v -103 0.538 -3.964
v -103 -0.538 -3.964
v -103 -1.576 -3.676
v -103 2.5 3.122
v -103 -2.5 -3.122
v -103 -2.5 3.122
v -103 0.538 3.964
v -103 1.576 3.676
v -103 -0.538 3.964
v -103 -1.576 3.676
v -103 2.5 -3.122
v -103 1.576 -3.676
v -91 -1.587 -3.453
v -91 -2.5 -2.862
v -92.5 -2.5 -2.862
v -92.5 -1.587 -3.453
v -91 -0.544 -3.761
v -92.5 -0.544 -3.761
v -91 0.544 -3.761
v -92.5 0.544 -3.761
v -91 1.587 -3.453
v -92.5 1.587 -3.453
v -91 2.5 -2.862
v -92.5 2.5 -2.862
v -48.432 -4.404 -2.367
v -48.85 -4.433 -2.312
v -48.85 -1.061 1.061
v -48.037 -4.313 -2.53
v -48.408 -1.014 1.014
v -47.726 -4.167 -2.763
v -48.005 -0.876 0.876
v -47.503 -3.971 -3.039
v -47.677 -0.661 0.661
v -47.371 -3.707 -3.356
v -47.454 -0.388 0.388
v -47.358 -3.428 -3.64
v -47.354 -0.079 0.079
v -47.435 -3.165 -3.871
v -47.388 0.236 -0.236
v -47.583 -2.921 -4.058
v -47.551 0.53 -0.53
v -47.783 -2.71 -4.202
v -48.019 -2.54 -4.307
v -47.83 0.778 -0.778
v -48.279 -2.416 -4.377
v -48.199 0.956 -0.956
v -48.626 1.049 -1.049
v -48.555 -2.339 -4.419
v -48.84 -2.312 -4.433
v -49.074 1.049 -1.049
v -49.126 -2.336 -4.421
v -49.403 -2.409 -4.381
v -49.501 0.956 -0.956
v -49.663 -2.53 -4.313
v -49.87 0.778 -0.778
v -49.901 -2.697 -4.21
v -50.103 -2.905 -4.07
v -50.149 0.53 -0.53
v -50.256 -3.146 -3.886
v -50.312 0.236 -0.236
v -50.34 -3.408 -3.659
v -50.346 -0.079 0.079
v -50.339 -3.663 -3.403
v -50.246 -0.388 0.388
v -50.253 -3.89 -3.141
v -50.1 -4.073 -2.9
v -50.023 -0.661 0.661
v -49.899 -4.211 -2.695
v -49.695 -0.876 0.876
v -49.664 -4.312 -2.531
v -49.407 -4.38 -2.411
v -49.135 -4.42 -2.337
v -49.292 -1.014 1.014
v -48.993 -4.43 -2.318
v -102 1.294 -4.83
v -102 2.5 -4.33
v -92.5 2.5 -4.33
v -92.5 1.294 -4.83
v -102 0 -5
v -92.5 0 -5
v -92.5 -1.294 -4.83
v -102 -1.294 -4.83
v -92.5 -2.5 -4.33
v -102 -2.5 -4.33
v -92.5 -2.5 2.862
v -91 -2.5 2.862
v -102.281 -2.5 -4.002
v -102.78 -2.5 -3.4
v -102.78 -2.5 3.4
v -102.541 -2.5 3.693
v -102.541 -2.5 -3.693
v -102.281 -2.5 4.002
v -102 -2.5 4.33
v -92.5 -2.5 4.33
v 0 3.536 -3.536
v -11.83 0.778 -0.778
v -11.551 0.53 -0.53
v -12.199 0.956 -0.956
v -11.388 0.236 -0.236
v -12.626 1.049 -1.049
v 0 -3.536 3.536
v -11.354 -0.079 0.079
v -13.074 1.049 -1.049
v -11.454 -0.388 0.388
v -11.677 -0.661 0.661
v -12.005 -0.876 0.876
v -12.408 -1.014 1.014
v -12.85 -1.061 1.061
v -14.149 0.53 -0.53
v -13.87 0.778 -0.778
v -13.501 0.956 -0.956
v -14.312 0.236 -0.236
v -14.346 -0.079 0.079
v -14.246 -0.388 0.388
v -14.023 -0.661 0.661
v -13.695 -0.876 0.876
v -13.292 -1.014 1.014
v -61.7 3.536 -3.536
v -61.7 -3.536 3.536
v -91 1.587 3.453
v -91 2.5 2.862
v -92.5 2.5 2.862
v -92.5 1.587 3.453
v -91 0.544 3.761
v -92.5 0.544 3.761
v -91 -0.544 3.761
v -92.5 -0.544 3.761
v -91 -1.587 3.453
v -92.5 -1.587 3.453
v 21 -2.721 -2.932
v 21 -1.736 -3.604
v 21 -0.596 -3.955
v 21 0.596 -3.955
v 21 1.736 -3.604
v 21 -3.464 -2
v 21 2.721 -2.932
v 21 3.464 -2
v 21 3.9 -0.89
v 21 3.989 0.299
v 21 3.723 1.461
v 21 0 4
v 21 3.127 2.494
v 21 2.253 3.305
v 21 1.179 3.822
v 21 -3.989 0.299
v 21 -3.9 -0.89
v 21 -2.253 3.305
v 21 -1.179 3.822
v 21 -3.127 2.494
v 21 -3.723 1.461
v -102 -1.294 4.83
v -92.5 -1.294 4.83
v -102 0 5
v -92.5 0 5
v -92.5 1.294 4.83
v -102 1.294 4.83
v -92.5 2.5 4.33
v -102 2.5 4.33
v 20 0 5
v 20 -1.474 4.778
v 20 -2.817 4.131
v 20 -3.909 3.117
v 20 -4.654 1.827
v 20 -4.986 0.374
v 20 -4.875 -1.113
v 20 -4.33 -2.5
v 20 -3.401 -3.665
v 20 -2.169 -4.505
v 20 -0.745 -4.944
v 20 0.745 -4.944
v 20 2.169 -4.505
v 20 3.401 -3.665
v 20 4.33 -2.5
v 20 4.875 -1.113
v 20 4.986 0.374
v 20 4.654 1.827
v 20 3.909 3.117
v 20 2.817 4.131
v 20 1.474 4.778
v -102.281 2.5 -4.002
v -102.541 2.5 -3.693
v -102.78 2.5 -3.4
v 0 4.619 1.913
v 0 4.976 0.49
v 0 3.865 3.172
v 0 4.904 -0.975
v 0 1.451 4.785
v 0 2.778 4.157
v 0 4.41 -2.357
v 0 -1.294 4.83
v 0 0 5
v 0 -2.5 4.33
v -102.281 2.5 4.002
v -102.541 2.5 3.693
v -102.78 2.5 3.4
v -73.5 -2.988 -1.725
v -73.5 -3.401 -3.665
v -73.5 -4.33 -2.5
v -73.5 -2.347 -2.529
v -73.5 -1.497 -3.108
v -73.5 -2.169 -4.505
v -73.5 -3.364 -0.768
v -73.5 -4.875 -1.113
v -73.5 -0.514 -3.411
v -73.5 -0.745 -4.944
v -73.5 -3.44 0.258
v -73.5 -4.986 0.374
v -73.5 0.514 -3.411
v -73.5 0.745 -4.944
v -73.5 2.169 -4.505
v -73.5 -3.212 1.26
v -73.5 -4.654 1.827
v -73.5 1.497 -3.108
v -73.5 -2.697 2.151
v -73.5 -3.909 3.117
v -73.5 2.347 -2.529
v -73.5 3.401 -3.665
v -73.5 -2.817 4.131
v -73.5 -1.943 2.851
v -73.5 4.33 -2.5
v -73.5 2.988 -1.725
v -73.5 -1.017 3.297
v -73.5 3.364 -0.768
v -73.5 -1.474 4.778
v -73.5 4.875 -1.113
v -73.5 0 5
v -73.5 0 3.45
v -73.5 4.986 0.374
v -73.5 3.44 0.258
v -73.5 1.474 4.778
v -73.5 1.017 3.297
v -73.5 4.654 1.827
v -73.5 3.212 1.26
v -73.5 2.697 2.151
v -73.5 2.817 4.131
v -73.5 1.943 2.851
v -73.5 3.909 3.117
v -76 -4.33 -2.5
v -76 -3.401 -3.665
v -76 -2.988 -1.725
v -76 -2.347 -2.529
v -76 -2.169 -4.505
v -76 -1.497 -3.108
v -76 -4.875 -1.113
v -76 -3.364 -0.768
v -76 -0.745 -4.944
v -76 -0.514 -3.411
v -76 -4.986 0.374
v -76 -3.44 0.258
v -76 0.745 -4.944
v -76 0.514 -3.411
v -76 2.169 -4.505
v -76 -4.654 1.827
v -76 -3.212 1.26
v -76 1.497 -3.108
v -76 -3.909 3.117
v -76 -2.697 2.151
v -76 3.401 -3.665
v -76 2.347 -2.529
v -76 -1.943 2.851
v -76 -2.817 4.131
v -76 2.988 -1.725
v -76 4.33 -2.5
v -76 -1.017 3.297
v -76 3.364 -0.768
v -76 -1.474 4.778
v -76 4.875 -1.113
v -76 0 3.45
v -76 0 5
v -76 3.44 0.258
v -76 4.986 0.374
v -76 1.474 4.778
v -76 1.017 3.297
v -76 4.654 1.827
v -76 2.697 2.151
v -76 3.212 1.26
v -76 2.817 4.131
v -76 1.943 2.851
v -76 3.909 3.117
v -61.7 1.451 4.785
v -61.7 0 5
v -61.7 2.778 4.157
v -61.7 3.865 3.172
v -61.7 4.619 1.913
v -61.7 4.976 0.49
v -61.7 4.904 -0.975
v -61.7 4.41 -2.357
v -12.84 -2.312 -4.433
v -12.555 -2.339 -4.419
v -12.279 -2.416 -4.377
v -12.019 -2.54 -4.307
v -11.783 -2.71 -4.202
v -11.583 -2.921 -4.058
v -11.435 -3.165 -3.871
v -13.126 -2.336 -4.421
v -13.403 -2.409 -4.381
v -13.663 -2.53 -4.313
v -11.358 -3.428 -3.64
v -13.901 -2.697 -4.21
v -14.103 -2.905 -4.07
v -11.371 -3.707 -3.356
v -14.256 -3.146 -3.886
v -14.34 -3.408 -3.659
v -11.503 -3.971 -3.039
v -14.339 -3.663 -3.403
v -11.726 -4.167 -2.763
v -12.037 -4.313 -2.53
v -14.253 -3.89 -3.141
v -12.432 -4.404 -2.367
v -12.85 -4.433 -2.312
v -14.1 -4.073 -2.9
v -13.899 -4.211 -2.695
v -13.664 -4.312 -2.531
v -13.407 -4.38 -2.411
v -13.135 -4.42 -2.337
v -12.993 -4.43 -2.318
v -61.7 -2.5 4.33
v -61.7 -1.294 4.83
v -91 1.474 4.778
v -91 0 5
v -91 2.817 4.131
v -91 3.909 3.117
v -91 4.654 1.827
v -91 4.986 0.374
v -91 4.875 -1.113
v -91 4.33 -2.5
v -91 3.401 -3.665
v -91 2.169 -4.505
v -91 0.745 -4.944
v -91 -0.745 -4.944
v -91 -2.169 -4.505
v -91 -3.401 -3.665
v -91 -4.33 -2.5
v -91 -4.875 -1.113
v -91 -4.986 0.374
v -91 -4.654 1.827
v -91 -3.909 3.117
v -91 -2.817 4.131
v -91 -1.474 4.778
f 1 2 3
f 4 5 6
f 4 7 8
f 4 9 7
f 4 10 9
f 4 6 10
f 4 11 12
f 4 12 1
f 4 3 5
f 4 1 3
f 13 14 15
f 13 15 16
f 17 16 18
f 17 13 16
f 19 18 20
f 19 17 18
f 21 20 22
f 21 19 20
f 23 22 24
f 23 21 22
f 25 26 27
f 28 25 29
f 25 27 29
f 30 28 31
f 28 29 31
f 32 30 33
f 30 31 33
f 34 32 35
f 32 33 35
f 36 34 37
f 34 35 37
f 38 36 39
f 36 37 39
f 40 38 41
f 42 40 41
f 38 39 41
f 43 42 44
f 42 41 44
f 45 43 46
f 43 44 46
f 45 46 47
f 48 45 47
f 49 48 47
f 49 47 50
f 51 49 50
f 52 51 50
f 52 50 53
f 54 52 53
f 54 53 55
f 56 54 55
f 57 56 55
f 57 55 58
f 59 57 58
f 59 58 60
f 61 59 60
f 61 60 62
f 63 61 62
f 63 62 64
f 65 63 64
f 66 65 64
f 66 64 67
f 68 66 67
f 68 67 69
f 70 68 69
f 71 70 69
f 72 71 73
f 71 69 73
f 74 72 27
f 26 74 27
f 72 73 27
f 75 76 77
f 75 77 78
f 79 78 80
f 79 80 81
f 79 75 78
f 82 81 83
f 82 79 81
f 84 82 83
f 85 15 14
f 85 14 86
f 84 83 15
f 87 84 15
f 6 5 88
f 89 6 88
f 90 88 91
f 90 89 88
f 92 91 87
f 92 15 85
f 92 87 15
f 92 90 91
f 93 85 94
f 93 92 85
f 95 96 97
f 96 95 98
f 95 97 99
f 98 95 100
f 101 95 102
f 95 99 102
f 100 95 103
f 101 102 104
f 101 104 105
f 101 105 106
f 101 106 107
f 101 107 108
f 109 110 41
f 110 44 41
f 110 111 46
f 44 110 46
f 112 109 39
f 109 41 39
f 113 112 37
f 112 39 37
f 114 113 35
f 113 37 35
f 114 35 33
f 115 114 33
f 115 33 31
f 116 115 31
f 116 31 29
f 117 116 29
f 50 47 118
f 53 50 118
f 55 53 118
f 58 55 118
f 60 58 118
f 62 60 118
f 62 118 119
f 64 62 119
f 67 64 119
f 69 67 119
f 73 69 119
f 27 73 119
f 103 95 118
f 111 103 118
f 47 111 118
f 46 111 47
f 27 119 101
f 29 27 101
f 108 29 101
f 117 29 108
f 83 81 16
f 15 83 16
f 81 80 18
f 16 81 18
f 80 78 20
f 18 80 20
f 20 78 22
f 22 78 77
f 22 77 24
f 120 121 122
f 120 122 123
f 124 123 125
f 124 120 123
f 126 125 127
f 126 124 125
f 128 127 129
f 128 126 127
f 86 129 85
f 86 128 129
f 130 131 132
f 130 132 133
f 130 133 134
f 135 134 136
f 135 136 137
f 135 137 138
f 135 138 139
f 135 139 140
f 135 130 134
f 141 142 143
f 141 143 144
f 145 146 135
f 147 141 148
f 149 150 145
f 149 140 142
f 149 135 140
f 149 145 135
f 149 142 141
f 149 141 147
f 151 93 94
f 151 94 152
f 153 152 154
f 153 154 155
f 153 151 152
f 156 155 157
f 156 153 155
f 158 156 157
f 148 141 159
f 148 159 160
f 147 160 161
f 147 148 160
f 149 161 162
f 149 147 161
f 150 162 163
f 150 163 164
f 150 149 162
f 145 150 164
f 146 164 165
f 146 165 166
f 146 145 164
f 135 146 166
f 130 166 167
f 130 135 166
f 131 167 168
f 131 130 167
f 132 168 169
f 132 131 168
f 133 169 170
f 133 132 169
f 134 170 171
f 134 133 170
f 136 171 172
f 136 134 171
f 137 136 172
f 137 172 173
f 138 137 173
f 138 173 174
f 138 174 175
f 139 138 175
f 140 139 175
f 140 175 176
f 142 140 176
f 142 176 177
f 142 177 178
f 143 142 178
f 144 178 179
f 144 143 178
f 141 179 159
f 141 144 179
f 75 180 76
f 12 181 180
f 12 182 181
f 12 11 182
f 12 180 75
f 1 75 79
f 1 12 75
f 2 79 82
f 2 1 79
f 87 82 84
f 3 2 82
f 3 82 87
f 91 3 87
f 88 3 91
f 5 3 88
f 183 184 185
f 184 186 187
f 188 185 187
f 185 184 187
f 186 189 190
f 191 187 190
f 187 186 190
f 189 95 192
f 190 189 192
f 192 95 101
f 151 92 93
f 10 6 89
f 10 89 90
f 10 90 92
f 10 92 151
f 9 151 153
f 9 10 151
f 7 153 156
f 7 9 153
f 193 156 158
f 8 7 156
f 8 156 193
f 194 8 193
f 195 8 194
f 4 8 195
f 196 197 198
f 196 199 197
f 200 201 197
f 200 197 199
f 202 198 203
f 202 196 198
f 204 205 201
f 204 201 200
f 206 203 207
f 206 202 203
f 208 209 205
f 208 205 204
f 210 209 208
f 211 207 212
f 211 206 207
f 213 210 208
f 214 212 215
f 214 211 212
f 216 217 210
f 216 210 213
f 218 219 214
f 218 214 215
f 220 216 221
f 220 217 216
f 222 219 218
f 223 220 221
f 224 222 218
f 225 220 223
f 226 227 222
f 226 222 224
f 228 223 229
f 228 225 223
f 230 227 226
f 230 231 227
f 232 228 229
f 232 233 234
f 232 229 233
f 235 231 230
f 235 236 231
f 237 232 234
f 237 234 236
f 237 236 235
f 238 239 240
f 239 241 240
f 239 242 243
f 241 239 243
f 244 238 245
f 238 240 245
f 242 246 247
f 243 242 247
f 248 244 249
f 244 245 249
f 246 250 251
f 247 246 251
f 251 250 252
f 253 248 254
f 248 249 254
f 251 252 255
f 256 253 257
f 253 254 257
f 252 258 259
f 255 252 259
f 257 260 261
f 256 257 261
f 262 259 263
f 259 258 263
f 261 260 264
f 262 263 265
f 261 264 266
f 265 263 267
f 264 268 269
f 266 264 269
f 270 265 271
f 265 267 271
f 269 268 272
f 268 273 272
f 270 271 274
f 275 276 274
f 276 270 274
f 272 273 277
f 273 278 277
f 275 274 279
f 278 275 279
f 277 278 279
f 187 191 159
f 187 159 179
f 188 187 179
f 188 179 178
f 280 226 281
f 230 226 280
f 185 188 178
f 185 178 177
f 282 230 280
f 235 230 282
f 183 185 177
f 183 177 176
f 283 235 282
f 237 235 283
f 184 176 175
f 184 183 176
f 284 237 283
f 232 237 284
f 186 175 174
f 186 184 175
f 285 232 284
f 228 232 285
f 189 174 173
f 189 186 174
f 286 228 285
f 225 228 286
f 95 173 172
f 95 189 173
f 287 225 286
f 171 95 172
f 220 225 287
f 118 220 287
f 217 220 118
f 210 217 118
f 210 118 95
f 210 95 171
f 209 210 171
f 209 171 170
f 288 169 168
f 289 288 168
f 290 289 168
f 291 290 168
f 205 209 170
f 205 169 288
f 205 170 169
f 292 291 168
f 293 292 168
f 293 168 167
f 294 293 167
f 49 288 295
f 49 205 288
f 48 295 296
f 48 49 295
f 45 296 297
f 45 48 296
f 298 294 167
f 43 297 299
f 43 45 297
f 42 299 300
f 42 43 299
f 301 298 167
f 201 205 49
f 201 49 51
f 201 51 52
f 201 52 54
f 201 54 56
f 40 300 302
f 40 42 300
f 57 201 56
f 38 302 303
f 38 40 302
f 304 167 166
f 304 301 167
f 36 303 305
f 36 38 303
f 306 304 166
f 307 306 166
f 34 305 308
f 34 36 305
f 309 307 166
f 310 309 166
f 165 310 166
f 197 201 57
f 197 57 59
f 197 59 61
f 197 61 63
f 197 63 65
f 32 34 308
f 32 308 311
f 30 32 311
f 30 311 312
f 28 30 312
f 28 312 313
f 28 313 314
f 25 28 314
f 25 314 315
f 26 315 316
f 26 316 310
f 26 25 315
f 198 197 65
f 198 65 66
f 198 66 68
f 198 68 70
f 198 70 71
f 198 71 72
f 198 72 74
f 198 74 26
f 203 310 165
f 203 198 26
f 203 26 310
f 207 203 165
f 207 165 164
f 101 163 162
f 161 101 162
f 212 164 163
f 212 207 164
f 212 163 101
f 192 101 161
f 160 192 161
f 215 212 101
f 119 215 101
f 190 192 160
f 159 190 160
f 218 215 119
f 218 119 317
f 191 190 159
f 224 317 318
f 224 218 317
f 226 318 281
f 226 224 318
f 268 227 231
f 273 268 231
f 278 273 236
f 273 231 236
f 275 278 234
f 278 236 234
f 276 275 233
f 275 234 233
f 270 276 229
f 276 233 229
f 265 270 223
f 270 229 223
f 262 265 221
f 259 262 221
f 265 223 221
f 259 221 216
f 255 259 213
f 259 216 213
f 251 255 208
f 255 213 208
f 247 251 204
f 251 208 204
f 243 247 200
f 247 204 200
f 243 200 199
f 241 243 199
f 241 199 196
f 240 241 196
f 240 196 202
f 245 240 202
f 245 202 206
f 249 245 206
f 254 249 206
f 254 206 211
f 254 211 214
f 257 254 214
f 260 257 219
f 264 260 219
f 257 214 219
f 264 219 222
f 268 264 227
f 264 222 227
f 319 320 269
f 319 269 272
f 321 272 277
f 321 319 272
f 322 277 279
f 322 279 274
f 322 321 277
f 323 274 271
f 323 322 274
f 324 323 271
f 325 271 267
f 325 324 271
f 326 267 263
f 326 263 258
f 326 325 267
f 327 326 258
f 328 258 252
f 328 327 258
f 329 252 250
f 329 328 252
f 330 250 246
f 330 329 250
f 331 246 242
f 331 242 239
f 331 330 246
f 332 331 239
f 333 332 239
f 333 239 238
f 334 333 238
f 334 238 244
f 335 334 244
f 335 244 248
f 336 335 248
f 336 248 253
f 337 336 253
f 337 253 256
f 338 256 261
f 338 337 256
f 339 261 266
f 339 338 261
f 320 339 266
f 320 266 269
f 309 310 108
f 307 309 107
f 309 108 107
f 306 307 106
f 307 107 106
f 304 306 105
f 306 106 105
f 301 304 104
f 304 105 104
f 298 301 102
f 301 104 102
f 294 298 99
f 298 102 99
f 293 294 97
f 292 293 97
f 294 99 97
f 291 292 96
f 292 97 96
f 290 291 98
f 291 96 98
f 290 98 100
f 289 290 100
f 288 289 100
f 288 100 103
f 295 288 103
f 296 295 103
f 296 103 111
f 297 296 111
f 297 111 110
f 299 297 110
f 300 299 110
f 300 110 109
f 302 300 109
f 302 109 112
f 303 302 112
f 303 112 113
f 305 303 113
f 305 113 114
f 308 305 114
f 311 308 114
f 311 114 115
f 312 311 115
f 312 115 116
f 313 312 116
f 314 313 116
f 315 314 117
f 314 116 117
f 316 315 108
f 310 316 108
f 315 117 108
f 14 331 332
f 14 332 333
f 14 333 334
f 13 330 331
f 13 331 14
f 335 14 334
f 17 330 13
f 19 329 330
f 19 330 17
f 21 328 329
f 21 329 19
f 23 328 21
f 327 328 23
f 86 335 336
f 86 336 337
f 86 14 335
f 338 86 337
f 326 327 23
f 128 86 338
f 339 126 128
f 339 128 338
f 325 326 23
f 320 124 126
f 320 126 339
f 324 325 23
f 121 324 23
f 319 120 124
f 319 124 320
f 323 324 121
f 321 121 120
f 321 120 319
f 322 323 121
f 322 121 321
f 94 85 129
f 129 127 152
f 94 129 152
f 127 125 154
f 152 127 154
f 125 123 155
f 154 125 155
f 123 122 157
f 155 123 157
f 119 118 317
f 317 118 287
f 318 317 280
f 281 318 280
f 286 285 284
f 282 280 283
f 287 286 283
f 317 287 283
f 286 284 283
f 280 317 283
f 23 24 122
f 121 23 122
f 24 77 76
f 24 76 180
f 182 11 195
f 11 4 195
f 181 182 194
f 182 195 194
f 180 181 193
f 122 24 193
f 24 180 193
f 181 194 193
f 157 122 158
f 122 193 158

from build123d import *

# Parameters (mm, degrees)
SKETCH1_R            = 5
BOSS_EXTRUDE1_DEPTH  = 21
CHAMFER1_SIZE        = 1
BOSS_EXTRUDE2_START  = 61.7
BOSS_EXTRUDE2_DEPTH  = 61.7
BOSS_EXTRUDE5_START  = 11.8
SKETCH3_R            = 5
BOSS_EXTRUDE5_DEPTH  = 11.8
SKETCH5_R            = 3.45
BOSS_EXTRUDE6_DEPTH  = 2.5
BOSS_EXTRUDE7_START  = 15
SKETCH6_R            = 5
BOSS_EXTRUDE7_DEPTH  = 15
BOSS_EXTRUDE8_DEPTH  = 1.5
BOSS_EXTRUDE10_START = 10.5
SKETCH9_R            = 5
BOSS_EXTRUDE10_DEPTH = 10.5
CHAMFER3_SIZE        = 1
CUT_EXTRUDE1_DEPTH   = 10.5
SKETCH11_R           = 1.5
CUT_EXTRUDE2_DEPTH   = 10.5


with BuildPart() as part:
    # Sketch1 → Boss-Extrude1 (new body)
    with BuildSketch(Plane(origin=(0, 0, 0), x_dir=(0, 0, -1), z_dir=(1, 0, 0))):
        with Locations(Location((0, 0, 0), (0, 0, 180))):
            Circle(SKETCH1_R)
    extrude(amount=BOSS_EXTRUDE1_DEPTH)

    # Chamfer1
    chamfer1_edges = [part.edges().sort_by_distance(p)[0] for p in [
        (21, 0, -5),
    ]]
    chamfer(chamfer1_edges, length=CHAMFER1_SIZE)

    # Sketch2 → Boss-Extrude2 (add)
    with BuildSketch(Plane.ZY.offset(BOSS_EXTRUDE2_START)):
        with BuildLine():
            Line((-3.535533906, 3.535533906), (3.535533906, -3.535533906))
            ThreePointArc((3.535533906, -3.535533906), (-3.535533906, -3.535533906), (-3.535533906, 3.535533906))
        make_face()
    extrude(amount=-BOSS_EXTRUDE2_DEPTH)

    # Sketch3 → Boss-Extrude5 (add)
    with BuildSketch(Plane.ZY.offset(61.7).offset(BOSS_EXTRUDE5_START)):
        Circle(SKETCH3_R)
    extrude(amount=-BOSS_EXTRUDE5_DEPTH)

    # Sketch5 → Boss-Extrude6 (add)
    with BuildSketch(Plane.ZY.offset(73.5)):
        Circle(SKETCH5_R)
    extrude(amount=BOSS_EXTRUDE6_DEPTH)

    # Sketch6 → Boss-Extrude7 (add)
    with BuildSketch(Plane.ZY.offset(76).offset(BOSS_EXTRUDE7_START)):
        Circle(SKETCH6_R)
    extrude(amount=-BOSS_EXTRUDE7_DEPTH)

    # Sketch7 → Boss-Extrude8 (add)
    with BuildSketch(Plane.ZY.offset(91)):
        with BuildLine():
            Line((-2.861817604, 2.5), (2.861817604, 2.5))
            ThreePointArc((2.861817604, 2.5), (3.8, 0), (2.861817604, -2.5))
            Line((2.861817604, -2.5), (-2.861817604, -2.5))
            ThreePointArc((-2.861817604, -2.5), (-3.8, 0), (-2.861817604, 2.5))
        make_face()
    extrude(amount=BOSS_EXTRUDE8_DEPTH)

    # Sketch9 → Boss-Extrude10 (add)
    with BuildSketch(Plane.ZY.offset(92.5).offset(BOSS_EXTRUDE10_START)):
        Circle(SKETCH9_R)
    extrude(amount=-BOSS_EXTRUDE10_DEPTH)

    # Chamfer3
    chamfer3_edges = [part.edges().sort_by_distance(p)[0] for p in [
        (-103, 0, -5),
    ]]
    chamfer(chamfer3_edges, length=CHAMFER3_SIZE)

    # Sketch10 → Cut-Extrude1 (cut)
    with BuildSketch(Plane.ZY.offset(103)):
        with BuildLine():
            Line((-4.330127019, 2.5), (4.330127019, 2.5))
            ThreePointArc((4.330127019, 2.5), (0, 5), (-4.330127019, 2.5))
        make_face()
        with BuildLine():
            Line((-4.330127019, -2.5), (4.330127019, -2.5))
            ThreePointArc((4.330127019, -2.5), (0, -5), (-4.330127019, -2.5))
        make_face()
    extrude(amount=-CUT_EXTRUDE1_DEPTH, mode=Mode.SUBTRACT)

    # Sketch11 → Cut-Extrude2 (cut)
    with BuildSketch(Plane(origin=(0, 0, 0), x_dir=(1, 0, 0), z_dir=(0, 0.7071067811865468, 0.7071067811865483))):
        with Locations(Location((-12.85, 0, 0), (0, 0, 270))):
            Circle(SKETCH11_R)
        with Locations(Location((-48.85, 0, 0), (0, 0, 270))):
            Circle(SKETCH11_R)
    extrude(amount=-CUT_EXTRUDE2_DEPTH, mode=Mode.SUBTRACT)


solid = part.part
